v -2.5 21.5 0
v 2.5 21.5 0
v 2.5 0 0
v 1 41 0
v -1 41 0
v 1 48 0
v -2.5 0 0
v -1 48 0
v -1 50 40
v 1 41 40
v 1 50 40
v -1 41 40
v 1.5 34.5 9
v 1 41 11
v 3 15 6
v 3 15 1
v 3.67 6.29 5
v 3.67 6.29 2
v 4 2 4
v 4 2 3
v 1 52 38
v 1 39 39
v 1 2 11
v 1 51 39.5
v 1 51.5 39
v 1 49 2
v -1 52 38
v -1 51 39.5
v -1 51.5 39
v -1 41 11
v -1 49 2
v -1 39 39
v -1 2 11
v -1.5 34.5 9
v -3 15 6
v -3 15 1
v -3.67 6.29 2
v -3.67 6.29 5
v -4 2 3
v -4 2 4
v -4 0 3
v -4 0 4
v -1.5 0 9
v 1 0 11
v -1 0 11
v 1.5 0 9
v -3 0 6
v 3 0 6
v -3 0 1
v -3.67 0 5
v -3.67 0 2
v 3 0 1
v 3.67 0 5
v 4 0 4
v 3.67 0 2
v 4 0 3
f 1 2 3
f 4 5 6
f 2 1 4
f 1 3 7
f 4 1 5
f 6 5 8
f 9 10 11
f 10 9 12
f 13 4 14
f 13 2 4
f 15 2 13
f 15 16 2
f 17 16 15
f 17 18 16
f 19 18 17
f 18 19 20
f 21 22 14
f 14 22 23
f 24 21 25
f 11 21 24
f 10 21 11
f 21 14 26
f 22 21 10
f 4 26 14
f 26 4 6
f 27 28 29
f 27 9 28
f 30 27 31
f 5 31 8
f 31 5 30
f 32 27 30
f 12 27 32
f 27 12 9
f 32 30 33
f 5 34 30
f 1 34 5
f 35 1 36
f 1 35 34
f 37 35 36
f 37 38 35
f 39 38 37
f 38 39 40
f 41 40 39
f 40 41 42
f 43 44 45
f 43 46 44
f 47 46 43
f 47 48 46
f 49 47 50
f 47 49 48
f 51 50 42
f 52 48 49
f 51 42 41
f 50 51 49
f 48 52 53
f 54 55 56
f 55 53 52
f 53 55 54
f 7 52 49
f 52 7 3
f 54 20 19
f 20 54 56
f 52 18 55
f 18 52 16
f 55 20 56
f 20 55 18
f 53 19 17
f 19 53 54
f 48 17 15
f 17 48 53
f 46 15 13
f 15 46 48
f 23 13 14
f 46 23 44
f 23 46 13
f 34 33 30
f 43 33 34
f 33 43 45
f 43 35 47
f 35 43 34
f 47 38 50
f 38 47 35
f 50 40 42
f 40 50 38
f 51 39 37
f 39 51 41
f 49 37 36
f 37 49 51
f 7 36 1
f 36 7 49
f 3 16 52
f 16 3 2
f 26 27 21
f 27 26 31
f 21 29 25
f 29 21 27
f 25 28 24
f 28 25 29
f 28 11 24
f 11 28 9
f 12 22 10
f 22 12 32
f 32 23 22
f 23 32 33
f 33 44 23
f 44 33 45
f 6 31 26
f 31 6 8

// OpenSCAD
triple_extrude( 
    [[0,0],[48,0], [49,2], [52,38], [51.5,39], [51,39.5], [50,40], 
        [41,40],[39, 39], [2, 11], [0,11]], 
    [[4,0], [6.5,0], [7,1], [7.67,2], [8,3], [8,4], [7.67,5],
        [7,6], [6,8], [5.5,9], [5,11], [5,40],
        [3,40], [3,11], [2.5,9], [2,8], [1,6], [0.33,5], [0,4], [0,3], 
        [0.33,2], [1,1], [1.5,0] ], 
    [[0,0], [8,0], [8,2], [5, 41], [5, 52],    
        [3,52], [3,41], [0,2]]);



module triple_extrude( x_shape, y_shape, z_shape ) {
x_translate = -extrude_x_width(x_shape, y_shape, z_shape) / 2;

translate([x_translate, 0, 0])
intersection() {
    
// Langs z-aksen
linear_extrude( height = extrude_z_width(x_shape, y_shape, z_shape), center = false )
polygon( z_shape );

// Langs y-aksen
mirror([0,1,0])
rotate([90, 0, 0])
linear_extrude( height = extrude_y_width(x_shape, y_shape, z_shape), center = false )
polygon( y_shape );

rotate([90, 0, 0]) rotate([0, 90, 0])
linear_extrude( height = extrude_x_width(x_shape, y_shape, z_shape), center = false )
polygon( x_shape );
}
}

module triple_extrude_debug( x_shape, y_shape, z_shape) {

union() {
    
// Langs z-aksen
color("red") 
translate([0,0,-1])
linear_extrude( height = extrude_z_width(x_shape, y_shape, z_shape)+2, center = false )
polygon( z_shape );

// Langs y-aksen
color("blue")
mirror([0,1,0])
rotate([90, 0, 0])
translate([0,0,-1])
linear_extrude( height = extrude_y_width(x_shape, y_shape, z_shape)+2, center = false )
polygon( y_shape );

color("green")
rotate([90, 0, 0]) rotate([0, 90, 0])
translate([0,0,-1])
linear_extrude( height = extrude_x_width(x_shape, y_shape, z_shape)+2, center = false )
polygon( x_shape );
}
}

function total_max(cls) = 
    max (
        [ for ( cl = cls )
            coord_list_max(cl)
         ]
    );

function coord_list_max(cl) = max(x_max(cl), y_max(cl));

function x_max( cl ) = max([ for ( c = cl ) c[0] ]);

function y_max( cl ) = max([ for ( c = cl ) c[1] ]);
        
function extrude_x_width(x_shape, y_shape, z_shape) = min( x_max( y_shape ), x_max( z_shape ));
function extrude_y_width(x_shape, y_shape, z_shape) = min( x_max( x_shape ), y_max( z_shape ));
function extrude_z_width(x_shape, y_shape, z_shape) = min( y_max( x_shape ), y_max( y_shape ));

        
        
